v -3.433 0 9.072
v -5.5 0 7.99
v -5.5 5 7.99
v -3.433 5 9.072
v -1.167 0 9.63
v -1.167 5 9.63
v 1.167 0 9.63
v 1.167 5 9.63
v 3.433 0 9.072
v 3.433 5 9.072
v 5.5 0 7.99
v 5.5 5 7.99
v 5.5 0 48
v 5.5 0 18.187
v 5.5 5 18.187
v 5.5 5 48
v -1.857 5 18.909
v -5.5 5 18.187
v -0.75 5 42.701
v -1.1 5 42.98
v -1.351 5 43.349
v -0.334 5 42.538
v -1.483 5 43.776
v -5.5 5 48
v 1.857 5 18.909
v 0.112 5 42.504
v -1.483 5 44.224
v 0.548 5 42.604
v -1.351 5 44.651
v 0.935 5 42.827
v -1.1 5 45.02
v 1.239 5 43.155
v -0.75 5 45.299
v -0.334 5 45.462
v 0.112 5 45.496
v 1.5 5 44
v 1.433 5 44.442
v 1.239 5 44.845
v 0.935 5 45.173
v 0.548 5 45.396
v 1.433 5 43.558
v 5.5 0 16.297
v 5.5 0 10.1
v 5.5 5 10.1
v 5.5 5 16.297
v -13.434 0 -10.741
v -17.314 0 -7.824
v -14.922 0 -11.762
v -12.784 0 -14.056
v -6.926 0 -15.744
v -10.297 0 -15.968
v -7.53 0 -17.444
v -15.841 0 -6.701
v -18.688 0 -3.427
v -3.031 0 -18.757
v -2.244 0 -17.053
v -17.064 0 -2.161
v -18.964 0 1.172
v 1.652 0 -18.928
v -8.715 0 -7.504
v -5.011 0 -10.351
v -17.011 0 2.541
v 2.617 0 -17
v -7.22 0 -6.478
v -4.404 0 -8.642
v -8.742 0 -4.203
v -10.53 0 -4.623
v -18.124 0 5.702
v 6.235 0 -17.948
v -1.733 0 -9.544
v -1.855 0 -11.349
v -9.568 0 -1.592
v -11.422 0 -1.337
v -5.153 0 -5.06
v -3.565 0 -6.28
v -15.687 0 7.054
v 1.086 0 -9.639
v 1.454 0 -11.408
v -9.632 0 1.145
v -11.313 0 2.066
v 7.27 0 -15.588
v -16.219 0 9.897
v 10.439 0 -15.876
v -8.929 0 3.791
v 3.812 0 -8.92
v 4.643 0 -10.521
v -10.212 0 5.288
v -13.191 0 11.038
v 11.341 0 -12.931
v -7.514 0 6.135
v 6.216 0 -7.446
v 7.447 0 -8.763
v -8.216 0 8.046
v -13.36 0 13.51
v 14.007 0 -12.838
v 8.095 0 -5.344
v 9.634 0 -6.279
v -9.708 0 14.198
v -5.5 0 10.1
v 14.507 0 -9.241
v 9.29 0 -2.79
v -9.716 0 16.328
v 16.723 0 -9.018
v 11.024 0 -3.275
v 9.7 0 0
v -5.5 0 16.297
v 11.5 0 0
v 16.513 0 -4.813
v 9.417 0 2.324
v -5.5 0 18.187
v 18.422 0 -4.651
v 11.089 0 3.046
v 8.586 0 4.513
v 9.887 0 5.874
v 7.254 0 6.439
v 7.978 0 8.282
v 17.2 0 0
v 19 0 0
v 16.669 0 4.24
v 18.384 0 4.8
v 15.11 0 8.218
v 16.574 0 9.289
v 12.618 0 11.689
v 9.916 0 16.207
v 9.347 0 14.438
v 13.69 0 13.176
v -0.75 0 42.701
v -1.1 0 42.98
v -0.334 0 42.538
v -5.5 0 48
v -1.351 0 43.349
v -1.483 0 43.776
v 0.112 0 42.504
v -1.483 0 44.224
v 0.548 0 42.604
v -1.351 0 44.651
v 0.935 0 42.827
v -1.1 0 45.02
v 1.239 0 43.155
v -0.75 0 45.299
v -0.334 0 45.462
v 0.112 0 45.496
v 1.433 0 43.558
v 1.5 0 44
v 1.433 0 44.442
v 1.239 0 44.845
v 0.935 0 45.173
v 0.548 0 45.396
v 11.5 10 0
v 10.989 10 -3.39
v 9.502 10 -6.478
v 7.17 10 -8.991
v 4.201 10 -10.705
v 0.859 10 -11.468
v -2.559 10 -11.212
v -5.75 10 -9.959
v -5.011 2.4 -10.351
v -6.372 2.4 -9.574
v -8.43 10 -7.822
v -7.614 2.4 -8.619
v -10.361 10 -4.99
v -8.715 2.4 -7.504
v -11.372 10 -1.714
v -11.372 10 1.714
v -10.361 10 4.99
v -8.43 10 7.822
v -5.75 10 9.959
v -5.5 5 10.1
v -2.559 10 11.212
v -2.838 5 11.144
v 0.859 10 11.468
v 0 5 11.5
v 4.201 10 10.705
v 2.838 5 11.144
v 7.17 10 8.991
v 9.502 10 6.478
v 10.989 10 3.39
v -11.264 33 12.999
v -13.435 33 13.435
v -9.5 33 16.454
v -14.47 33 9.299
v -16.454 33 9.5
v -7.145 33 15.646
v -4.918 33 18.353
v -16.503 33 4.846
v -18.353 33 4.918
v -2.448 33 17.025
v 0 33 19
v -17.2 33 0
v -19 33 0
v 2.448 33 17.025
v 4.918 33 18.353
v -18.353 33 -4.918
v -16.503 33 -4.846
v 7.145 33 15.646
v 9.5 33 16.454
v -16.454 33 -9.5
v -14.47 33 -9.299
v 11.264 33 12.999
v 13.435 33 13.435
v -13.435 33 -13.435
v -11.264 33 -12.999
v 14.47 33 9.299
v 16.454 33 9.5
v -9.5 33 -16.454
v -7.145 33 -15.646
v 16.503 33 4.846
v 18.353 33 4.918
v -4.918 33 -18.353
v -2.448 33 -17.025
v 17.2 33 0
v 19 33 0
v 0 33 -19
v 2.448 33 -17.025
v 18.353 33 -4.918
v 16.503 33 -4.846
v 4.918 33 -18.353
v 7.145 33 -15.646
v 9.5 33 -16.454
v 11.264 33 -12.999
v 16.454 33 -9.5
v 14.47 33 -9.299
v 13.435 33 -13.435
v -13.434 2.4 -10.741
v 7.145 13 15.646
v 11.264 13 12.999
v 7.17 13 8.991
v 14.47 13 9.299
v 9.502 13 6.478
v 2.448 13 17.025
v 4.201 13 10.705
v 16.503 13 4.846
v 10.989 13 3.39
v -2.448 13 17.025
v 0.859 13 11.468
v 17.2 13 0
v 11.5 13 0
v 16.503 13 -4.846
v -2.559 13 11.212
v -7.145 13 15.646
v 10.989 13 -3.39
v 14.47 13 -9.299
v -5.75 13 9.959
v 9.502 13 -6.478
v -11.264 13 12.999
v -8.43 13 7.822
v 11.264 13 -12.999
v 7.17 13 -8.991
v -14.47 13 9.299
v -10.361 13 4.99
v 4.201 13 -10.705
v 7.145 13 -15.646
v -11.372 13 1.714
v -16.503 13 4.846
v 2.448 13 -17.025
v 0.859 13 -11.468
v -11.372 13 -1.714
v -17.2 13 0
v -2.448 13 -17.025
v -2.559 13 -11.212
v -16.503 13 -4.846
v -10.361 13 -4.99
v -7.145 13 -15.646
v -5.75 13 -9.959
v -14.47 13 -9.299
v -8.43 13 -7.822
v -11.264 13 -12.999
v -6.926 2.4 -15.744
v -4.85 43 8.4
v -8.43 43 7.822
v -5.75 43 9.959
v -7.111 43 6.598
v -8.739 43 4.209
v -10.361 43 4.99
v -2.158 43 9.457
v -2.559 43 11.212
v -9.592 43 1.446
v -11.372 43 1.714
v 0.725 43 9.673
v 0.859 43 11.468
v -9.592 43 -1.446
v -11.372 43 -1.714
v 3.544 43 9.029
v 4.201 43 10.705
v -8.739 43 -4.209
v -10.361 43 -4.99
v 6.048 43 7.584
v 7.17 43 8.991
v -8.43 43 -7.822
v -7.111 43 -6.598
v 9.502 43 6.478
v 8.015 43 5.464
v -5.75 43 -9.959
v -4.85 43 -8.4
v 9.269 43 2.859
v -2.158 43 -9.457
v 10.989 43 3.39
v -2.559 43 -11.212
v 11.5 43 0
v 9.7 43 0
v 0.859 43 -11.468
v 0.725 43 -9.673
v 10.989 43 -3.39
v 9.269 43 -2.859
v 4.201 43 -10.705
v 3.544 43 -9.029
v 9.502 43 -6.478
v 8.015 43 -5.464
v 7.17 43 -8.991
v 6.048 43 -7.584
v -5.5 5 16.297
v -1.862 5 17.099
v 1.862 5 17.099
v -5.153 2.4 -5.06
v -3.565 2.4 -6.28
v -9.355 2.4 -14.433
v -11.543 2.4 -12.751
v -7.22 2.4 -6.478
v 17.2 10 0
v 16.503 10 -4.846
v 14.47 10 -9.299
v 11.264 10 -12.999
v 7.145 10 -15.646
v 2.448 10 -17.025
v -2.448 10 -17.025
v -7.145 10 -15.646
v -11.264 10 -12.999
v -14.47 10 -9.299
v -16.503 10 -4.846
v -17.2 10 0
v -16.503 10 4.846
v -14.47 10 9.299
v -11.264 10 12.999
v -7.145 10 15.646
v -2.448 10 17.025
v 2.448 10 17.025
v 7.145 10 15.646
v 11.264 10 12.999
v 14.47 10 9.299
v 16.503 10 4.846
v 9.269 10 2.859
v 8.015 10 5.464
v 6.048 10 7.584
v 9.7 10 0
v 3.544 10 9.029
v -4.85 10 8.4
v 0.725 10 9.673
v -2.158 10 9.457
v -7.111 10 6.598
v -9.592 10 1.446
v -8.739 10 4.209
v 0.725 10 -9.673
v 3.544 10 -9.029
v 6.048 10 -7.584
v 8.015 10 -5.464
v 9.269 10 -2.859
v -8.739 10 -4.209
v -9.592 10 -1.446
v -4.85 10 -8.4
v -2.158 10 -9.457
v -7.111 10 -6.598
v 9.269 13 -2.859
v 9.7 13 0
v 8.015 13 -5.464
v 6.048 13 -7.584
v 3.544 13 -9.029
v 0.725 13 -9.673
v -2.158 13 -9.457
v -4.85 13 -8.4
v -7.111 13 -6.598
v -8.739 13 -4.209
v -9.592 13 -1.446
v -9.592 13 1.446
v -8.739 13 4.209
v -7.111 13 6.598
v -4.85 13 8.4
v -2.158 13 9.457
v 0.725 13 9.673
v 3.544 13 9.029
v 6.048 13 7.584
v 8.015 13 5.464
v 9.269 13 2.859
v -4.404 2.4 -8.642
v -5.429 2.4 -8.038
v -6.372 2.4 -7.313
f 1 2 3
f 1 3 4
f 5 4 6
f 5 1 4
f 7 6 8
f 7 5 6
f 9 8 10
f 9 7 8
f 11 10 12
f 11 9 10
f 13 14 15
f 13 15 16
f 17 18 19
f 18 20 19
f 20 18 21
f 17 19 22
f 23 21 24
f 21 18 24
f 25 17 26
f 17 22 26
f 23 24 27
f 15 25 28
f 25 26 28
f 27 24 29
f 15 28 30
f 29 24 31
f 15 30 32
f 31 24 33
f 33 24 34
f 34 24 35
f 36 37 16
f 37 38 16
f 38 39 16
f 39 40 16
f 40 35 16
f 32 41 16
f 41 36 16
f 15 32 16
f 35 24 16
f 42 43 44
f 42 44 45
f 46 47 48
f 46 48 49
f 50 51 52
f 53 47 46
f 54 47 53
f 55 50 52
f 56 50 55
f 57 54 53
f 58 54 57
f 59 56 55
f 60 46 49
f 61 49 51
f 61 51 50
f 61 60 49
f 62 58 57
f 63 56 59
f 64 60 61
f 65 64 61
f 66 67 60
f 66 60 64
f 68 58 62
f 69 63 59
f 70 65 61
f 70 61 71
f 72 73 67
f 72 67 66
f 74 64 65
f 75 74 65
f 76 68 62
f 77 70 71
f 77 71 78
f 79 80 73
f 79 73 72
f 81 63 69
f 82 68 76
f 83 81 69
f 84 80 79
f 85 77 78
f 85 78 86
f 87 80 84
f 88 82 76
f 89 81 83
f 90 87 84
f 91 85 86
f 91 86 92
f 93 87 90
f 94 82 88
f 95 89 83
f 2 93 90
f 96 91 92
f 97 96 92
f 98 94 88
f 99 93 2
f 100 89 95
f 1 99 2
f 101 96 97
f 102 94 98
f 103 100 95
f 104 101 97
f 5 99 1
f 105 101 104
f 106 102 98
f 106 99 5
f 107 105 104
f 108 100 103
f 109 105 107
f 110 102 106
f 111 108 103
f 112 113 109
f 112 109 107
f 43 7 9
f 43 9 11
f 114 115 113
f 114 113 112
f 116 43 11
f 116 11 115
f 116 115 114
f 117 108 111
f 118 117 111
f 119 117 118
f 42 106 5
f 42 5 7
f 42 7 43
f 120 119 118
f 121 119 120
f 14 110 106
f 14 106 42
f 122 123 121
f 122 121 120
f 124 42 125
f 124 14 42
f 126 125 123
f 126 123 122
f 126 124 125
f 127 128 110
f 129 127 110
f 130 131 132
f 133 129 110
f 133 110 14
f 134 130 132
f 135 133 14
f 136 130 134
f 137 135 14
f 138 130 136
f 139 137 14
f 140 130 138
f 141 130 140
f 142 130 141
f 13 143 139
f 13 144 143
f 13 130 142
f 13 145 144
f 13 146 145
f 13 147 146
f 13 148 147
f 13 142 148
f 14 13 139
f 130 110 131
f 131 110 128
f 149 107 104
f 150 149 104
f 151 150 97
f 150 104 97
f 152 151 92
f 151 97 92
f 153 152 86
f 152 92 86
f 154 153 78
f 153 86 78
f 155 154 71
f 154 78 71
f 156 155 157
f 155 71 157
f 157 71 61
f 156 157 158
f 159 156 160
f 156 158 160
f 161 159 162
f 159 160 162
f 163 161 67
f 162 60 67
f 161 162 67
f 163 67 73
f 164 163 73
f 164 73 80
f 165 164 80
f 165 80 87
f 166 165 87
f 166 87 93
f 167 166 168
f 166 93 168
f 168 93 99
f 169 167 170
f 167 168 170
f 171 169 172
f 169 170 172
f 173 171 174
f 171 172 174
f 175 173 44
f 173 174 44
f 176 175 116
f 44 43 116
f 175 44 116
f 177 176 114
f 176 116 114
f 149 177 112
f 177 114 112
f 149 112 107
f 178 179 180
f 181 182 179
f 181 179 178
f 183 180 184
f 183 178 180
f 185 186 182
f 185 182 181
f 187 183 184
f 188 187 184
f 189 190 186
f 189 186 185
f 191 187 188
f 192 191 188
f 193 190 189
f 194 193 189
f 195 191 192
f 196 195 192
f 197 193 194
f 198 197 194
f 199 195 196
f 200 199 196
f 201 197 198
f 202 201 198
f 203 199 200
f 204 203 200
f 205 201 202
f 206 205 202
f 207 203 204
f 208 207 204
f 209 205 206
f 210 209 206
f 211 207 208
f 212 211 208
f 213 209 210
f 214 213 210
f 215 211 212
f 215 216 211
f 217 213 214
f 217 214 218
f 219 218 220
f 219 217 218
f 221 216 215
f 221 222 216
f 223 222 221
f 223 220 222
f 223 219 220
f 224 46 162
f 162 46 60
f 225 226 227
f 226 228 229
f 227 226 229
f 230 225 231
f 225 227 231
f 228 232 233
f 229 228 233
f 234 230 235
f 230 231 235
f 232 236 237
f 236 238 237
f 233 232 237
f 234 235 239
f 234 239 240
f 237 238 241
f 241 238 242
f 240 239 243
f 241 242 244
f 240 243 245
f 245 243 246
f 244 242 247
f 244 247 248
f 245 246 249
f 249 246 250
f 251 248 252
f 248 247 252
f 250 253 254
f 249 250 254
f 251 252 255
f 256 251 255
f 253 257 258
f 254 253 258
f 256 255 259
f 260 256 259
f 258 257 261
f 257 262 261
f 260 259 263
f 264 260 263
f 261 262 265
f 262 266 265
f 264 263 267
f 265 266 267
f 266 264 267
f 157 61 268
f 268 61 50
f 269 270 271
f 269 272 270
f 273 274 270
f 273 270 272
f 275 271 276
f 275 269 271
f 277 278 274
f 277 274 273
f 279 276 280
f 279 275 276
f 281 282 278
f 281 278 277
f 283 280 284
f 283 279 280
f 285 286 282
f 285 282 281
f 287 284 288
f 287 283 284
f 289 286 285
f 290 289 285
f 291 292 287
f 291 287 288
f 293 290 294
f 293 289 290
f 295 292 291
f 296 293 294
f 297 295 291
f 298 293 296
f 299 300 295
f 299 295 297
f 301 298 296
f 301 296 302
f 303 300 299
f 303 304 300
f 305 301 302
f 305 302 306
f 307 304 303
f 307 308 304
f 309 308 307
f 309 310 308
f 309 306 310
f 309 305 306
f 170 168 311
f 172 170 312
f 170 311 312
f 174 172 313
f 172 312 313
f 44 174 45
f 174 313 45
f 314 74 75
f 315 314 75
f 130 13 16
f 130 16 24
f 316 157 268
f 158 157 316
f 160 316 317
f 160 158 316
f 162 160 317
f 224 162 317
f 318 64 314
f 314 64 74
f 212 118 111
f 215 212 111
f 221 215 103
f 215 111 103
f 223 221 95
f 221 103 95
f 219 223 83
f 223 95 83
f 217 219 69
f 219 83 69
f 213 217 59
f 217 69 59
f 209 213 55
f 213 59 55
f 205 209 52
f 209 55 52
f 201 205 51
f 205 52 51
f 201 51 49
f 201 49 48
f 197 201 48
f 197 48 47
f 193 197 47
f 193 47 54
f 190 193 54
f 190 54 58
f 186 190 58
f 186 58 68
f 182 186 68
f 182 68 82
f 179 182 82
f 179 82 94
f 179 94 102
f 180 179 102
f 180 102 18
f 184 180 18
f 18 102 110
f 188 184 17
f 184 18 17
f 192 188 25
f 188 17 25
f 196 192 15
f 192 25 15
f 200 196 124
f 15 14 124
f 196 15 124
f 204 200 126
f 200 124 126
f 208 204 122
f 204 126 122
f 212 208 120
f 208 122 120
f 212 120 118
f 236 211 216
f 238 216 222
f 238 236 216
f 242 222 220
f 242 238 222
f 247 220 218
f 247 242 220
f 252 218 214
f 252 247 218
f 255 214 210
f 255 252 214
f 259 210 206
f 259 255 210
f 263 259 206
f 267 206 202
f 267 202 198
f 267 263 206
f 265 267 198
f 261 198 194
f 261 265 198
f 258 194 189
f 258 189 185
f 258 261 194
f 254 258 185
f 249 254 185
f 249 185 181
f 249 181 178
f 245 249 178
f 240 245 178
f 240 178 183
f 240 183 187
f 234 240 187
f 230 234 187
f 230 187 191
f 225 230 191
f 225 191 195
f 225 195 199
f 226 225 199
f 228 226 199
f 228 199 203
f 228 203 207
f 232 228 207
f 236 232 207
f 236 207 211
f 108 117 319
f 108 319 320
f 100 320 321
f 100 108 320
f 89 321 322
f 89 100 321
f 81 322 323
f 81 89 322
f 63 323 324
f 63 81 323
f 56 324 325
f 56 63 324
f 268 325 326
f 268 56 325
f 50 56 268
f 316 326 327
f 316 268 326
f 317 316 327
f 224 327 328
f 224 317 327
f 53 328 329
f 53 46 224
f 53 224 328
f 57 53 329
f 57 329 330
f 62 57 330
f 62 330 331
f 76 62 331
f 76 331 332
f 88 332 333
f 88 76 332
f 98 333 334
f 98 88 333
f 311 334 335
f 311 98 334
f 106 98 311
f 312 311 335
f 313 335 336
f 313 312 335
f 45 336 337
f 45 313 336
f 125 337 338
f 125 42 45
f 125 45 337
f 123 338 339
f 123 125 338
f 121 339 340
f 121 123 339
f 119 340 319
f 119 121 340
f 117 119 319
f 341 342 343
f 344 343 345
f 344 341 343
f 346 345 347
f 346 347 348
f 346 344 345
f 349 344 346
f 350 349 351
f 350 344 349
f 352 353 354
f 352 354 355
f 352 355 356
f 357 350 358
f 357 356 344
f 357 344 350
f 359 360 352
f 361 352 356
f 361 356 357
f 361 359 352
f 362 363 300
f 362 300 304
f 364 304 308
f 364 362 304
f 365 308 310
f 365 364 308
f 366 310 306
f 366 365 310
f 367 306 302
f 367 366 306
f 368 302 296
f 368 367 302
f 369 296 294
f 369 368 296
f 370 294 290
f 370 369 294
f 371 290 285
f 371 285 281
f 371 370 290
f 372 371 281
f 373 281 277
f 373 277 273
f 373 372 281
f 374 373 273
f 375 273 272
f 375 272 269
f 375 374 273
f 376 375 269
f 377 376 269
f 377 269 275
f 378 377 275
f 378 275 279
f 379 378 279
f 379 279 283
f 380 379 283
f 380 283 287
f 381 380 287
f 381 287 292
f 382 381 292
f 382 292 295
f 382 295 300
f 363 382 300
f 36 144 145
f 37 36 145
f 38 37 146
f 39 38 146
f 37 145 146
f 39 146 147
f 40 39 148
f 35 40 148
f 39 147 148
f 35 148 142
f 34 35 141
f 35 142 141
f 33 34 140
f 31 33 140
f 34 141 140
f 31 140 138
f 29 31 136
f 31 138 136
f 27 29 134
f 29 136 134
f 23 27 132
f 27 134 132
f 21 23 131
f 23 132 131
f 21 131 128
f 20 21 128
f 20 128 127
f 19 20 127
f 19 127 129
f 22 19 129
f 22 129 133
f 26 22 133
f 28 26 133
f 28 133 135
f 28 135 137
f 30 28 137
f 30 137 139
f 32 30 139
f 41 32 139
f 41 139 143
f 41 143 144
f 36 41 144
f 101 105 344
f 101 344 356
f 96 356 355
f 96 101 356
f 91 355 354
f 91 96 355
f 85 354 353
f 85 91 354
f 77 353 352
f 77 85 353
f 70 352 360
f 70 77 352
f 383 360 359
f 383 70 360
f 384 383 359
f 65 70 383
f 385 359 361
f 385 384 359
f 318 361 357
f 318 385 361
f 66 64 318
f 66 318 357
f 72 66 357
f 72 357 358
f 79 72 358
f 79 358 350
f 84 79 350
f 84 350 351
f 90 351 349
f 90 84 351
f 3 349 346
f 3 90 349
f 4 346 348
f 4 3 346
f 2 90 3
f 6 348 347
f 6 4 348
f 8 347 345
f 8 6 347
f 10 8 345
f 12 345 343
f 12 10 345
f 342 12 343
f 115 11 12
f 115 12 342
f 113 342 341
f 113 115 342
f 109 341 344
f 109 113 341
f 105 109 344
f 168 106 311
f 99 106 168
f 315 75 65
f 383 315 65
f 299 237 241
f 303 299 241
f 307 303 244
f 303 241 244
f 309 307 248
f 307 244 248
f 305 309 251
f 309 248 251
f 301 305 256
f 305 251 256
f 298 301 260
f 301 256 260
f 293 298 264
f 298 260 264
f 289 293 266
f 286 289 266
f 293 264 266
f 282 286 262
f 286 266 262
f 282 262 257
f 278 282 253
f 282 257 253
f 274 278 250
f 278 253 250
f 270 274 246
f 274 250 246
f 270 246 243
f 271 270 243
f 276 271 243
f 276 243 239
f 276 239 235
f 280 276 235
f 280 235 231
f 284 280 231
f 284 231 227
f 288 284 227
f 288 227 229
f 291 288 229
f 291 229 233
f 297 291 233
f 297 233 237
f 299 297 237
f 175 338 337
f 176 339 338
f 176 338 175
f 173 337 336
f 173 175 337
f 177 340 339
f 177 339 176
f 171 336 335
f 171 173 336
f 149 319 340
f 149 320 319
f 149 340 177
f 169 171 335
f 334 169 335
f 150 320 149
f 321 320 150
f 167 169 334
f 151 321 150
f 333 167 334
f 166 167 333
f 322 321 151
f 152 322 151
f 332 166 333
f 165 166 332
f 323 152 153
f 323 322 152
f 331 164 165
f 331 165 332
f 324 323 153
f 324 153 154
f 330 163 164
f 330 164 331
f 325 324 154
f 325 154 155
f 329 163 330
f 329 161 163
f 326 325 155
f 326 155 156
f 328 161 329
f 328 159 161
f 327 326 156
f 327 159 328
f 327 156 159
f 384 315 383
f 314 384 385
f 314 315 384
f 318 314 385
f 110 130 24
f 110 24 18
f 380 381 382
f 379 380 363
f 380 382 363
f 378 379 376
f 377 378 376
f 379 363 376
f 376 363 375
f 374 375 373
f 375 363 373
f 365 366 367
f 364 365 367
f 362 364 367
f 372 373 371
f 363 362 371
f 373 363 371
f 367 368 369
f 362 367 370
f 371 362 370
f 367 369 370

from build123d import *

# Parameters (mm, degrees)
SKETCH1_R           = 19
SKETCH1_R_2         = 17.2
BOSS_EXTRUDE1_DEPTH = 33
SKETCH1_3_R         = 11.5
SKETCH1_3_R_2       = 9.7
BOSS_EXTRUDE2_DEPTH = 43
SKETCH2_R           = 17.2
BOSS_EXTRUDE3_DEPTH = 3
BOSS_EXTRUDE4_DEPTH = 2.4
BOSS_EXTRUDE5_DEPTH = 5
SKETCH5_R           = 1.5
CUT_EXTRUDE1_DEPTH  = 44


with BuildPart() as part:
    # Sketch1 → Boss-Extrude1 (new body)
    with BuildSketch(Plane(origin=(0, 0, 0), x_dir=(1, 0, 0), z_dir=(0, 1, 0))):
        Circle(SKETCH1_R)
        Circle(SKETCH1_R_2, mode=Mode.SUBTRACT)
    extrude(amount=BOSS_EXTRUDE1_DEPTH)



with BuildPart() as body_2:
    # Sketch1_3 → Boss-Extrude2 (new body)
    with BuildSketch(Plane(origin=(0, 0, 0), x_dir=(1, 0, 0), z_dir=(0, 1, 0))):
        Circle(SKETCH1_3_R)
        Circle(SKETCH1_3_R_2, mode=Mode.SUBTRACT)
    extrude(amount=BOSS_EXTRUDE2_DEPTH)


with BuildPart() as part_1:
    add(part.part)

    add(body_2.part)  # Boss-Extrude3 merges body 2
    # Sketch2 → Boss-Extrude3 (add)
    with BuildSketch(Plane(origin=(0, 10, 0), x_dir=(-1, 0, 0), z_dir=(0, -1, 0))):
        Circle(SKETCH2_R)
    extrude(amount=-BOSS_EXTRUDE3_DEPTH)

    # Sketch3 → Boss-Extrude4 (add)
    with BuildSketch(Plane.XZ):
        with BuildLine():
            Line((-14.921917905, -11.7616481), (-5.15253427, -5.060203124))
            Line((-5.15253427, -5.060203124), (-3.565454801, -6.280270465))
            Line((-3.565454801, -6.280270465), (-7.530041661, -17.444152963))
            ThreePointArc((-7.530041661, -17.444152963), (-11.579954122, -15.063354956), (-14.921917905, -11.7616481))
        make_face()
    extrude(amount=-BOSS_EXTRUDE4_DEPTH)

    # Sketch4 → Boss-Extrude5 (add)
    with BuildSketch(Plane.XZ):
        with BuildLine():
            Line((-5.5, 16.296932227), (-5.5, 10.099504938))
            ThreePointArc((-5.5, 10.099504938), (0, 11.5), (5.5, 10.099504938))
            Line((5.5, 10.099504938), (5.5, 16.296932227))
            ThreePointArc((5.5, 16.296932227), (0, 17.2), (-5.5, 16.296932227))
        make_face()
        with BuildLine():
            Line((-5.5, 18.186533479), (-5.5, 16.296932227))
            ThreePointArc((-5.5, 16.296932227), (0, 17.2), (5.5, 16.296932227))
            Line((5.5, 16.296932227), (5.5, 18.186533479))
            ThreePointArc((5.5, 18.186533479), (0, 19), (-5.5, 18.186533479))
        make_face()
        with BuildLine():
            Line((-5.5, 48), (-5.5, 18.186533479))
            ThreePointArc((-5.5, 18.186533479), (0, 19), (5.5, 18.186533479))
            Line((5.5, 18.186533479), (5.5, 48))
            Line((5.5, 48), (-5.5, 48))
        make_face()
        with BuildLine():
            Line((-5.5, 10.099504938), (-5.5, 7.989993742))
            ThreePointArc((-5.5, 7.989993742), (0, 9.7), (5.5, 7.989993742))
            Line((5.5, 7.989993742), (5.5, 10.099504938))
            ThreePointArc((5.5, 10.099504938), (0, 11.5), (-5.5, 10.099504938))
        make_face()
    extrude(amount=-BOSS_EXTRUDE5_DEPTH)

    # Sketch5 → Cut-Extrude1 (cut, through all)
    with BuildSketch(Plane.XZ):
        with Locations((0, 44)):
            Circle(SKETCH5_R)
    extrude(amount=-CUT_EXTRUDE1_DEPTH, mode=Mode.SUBTRACT)


solid = part_1.part
